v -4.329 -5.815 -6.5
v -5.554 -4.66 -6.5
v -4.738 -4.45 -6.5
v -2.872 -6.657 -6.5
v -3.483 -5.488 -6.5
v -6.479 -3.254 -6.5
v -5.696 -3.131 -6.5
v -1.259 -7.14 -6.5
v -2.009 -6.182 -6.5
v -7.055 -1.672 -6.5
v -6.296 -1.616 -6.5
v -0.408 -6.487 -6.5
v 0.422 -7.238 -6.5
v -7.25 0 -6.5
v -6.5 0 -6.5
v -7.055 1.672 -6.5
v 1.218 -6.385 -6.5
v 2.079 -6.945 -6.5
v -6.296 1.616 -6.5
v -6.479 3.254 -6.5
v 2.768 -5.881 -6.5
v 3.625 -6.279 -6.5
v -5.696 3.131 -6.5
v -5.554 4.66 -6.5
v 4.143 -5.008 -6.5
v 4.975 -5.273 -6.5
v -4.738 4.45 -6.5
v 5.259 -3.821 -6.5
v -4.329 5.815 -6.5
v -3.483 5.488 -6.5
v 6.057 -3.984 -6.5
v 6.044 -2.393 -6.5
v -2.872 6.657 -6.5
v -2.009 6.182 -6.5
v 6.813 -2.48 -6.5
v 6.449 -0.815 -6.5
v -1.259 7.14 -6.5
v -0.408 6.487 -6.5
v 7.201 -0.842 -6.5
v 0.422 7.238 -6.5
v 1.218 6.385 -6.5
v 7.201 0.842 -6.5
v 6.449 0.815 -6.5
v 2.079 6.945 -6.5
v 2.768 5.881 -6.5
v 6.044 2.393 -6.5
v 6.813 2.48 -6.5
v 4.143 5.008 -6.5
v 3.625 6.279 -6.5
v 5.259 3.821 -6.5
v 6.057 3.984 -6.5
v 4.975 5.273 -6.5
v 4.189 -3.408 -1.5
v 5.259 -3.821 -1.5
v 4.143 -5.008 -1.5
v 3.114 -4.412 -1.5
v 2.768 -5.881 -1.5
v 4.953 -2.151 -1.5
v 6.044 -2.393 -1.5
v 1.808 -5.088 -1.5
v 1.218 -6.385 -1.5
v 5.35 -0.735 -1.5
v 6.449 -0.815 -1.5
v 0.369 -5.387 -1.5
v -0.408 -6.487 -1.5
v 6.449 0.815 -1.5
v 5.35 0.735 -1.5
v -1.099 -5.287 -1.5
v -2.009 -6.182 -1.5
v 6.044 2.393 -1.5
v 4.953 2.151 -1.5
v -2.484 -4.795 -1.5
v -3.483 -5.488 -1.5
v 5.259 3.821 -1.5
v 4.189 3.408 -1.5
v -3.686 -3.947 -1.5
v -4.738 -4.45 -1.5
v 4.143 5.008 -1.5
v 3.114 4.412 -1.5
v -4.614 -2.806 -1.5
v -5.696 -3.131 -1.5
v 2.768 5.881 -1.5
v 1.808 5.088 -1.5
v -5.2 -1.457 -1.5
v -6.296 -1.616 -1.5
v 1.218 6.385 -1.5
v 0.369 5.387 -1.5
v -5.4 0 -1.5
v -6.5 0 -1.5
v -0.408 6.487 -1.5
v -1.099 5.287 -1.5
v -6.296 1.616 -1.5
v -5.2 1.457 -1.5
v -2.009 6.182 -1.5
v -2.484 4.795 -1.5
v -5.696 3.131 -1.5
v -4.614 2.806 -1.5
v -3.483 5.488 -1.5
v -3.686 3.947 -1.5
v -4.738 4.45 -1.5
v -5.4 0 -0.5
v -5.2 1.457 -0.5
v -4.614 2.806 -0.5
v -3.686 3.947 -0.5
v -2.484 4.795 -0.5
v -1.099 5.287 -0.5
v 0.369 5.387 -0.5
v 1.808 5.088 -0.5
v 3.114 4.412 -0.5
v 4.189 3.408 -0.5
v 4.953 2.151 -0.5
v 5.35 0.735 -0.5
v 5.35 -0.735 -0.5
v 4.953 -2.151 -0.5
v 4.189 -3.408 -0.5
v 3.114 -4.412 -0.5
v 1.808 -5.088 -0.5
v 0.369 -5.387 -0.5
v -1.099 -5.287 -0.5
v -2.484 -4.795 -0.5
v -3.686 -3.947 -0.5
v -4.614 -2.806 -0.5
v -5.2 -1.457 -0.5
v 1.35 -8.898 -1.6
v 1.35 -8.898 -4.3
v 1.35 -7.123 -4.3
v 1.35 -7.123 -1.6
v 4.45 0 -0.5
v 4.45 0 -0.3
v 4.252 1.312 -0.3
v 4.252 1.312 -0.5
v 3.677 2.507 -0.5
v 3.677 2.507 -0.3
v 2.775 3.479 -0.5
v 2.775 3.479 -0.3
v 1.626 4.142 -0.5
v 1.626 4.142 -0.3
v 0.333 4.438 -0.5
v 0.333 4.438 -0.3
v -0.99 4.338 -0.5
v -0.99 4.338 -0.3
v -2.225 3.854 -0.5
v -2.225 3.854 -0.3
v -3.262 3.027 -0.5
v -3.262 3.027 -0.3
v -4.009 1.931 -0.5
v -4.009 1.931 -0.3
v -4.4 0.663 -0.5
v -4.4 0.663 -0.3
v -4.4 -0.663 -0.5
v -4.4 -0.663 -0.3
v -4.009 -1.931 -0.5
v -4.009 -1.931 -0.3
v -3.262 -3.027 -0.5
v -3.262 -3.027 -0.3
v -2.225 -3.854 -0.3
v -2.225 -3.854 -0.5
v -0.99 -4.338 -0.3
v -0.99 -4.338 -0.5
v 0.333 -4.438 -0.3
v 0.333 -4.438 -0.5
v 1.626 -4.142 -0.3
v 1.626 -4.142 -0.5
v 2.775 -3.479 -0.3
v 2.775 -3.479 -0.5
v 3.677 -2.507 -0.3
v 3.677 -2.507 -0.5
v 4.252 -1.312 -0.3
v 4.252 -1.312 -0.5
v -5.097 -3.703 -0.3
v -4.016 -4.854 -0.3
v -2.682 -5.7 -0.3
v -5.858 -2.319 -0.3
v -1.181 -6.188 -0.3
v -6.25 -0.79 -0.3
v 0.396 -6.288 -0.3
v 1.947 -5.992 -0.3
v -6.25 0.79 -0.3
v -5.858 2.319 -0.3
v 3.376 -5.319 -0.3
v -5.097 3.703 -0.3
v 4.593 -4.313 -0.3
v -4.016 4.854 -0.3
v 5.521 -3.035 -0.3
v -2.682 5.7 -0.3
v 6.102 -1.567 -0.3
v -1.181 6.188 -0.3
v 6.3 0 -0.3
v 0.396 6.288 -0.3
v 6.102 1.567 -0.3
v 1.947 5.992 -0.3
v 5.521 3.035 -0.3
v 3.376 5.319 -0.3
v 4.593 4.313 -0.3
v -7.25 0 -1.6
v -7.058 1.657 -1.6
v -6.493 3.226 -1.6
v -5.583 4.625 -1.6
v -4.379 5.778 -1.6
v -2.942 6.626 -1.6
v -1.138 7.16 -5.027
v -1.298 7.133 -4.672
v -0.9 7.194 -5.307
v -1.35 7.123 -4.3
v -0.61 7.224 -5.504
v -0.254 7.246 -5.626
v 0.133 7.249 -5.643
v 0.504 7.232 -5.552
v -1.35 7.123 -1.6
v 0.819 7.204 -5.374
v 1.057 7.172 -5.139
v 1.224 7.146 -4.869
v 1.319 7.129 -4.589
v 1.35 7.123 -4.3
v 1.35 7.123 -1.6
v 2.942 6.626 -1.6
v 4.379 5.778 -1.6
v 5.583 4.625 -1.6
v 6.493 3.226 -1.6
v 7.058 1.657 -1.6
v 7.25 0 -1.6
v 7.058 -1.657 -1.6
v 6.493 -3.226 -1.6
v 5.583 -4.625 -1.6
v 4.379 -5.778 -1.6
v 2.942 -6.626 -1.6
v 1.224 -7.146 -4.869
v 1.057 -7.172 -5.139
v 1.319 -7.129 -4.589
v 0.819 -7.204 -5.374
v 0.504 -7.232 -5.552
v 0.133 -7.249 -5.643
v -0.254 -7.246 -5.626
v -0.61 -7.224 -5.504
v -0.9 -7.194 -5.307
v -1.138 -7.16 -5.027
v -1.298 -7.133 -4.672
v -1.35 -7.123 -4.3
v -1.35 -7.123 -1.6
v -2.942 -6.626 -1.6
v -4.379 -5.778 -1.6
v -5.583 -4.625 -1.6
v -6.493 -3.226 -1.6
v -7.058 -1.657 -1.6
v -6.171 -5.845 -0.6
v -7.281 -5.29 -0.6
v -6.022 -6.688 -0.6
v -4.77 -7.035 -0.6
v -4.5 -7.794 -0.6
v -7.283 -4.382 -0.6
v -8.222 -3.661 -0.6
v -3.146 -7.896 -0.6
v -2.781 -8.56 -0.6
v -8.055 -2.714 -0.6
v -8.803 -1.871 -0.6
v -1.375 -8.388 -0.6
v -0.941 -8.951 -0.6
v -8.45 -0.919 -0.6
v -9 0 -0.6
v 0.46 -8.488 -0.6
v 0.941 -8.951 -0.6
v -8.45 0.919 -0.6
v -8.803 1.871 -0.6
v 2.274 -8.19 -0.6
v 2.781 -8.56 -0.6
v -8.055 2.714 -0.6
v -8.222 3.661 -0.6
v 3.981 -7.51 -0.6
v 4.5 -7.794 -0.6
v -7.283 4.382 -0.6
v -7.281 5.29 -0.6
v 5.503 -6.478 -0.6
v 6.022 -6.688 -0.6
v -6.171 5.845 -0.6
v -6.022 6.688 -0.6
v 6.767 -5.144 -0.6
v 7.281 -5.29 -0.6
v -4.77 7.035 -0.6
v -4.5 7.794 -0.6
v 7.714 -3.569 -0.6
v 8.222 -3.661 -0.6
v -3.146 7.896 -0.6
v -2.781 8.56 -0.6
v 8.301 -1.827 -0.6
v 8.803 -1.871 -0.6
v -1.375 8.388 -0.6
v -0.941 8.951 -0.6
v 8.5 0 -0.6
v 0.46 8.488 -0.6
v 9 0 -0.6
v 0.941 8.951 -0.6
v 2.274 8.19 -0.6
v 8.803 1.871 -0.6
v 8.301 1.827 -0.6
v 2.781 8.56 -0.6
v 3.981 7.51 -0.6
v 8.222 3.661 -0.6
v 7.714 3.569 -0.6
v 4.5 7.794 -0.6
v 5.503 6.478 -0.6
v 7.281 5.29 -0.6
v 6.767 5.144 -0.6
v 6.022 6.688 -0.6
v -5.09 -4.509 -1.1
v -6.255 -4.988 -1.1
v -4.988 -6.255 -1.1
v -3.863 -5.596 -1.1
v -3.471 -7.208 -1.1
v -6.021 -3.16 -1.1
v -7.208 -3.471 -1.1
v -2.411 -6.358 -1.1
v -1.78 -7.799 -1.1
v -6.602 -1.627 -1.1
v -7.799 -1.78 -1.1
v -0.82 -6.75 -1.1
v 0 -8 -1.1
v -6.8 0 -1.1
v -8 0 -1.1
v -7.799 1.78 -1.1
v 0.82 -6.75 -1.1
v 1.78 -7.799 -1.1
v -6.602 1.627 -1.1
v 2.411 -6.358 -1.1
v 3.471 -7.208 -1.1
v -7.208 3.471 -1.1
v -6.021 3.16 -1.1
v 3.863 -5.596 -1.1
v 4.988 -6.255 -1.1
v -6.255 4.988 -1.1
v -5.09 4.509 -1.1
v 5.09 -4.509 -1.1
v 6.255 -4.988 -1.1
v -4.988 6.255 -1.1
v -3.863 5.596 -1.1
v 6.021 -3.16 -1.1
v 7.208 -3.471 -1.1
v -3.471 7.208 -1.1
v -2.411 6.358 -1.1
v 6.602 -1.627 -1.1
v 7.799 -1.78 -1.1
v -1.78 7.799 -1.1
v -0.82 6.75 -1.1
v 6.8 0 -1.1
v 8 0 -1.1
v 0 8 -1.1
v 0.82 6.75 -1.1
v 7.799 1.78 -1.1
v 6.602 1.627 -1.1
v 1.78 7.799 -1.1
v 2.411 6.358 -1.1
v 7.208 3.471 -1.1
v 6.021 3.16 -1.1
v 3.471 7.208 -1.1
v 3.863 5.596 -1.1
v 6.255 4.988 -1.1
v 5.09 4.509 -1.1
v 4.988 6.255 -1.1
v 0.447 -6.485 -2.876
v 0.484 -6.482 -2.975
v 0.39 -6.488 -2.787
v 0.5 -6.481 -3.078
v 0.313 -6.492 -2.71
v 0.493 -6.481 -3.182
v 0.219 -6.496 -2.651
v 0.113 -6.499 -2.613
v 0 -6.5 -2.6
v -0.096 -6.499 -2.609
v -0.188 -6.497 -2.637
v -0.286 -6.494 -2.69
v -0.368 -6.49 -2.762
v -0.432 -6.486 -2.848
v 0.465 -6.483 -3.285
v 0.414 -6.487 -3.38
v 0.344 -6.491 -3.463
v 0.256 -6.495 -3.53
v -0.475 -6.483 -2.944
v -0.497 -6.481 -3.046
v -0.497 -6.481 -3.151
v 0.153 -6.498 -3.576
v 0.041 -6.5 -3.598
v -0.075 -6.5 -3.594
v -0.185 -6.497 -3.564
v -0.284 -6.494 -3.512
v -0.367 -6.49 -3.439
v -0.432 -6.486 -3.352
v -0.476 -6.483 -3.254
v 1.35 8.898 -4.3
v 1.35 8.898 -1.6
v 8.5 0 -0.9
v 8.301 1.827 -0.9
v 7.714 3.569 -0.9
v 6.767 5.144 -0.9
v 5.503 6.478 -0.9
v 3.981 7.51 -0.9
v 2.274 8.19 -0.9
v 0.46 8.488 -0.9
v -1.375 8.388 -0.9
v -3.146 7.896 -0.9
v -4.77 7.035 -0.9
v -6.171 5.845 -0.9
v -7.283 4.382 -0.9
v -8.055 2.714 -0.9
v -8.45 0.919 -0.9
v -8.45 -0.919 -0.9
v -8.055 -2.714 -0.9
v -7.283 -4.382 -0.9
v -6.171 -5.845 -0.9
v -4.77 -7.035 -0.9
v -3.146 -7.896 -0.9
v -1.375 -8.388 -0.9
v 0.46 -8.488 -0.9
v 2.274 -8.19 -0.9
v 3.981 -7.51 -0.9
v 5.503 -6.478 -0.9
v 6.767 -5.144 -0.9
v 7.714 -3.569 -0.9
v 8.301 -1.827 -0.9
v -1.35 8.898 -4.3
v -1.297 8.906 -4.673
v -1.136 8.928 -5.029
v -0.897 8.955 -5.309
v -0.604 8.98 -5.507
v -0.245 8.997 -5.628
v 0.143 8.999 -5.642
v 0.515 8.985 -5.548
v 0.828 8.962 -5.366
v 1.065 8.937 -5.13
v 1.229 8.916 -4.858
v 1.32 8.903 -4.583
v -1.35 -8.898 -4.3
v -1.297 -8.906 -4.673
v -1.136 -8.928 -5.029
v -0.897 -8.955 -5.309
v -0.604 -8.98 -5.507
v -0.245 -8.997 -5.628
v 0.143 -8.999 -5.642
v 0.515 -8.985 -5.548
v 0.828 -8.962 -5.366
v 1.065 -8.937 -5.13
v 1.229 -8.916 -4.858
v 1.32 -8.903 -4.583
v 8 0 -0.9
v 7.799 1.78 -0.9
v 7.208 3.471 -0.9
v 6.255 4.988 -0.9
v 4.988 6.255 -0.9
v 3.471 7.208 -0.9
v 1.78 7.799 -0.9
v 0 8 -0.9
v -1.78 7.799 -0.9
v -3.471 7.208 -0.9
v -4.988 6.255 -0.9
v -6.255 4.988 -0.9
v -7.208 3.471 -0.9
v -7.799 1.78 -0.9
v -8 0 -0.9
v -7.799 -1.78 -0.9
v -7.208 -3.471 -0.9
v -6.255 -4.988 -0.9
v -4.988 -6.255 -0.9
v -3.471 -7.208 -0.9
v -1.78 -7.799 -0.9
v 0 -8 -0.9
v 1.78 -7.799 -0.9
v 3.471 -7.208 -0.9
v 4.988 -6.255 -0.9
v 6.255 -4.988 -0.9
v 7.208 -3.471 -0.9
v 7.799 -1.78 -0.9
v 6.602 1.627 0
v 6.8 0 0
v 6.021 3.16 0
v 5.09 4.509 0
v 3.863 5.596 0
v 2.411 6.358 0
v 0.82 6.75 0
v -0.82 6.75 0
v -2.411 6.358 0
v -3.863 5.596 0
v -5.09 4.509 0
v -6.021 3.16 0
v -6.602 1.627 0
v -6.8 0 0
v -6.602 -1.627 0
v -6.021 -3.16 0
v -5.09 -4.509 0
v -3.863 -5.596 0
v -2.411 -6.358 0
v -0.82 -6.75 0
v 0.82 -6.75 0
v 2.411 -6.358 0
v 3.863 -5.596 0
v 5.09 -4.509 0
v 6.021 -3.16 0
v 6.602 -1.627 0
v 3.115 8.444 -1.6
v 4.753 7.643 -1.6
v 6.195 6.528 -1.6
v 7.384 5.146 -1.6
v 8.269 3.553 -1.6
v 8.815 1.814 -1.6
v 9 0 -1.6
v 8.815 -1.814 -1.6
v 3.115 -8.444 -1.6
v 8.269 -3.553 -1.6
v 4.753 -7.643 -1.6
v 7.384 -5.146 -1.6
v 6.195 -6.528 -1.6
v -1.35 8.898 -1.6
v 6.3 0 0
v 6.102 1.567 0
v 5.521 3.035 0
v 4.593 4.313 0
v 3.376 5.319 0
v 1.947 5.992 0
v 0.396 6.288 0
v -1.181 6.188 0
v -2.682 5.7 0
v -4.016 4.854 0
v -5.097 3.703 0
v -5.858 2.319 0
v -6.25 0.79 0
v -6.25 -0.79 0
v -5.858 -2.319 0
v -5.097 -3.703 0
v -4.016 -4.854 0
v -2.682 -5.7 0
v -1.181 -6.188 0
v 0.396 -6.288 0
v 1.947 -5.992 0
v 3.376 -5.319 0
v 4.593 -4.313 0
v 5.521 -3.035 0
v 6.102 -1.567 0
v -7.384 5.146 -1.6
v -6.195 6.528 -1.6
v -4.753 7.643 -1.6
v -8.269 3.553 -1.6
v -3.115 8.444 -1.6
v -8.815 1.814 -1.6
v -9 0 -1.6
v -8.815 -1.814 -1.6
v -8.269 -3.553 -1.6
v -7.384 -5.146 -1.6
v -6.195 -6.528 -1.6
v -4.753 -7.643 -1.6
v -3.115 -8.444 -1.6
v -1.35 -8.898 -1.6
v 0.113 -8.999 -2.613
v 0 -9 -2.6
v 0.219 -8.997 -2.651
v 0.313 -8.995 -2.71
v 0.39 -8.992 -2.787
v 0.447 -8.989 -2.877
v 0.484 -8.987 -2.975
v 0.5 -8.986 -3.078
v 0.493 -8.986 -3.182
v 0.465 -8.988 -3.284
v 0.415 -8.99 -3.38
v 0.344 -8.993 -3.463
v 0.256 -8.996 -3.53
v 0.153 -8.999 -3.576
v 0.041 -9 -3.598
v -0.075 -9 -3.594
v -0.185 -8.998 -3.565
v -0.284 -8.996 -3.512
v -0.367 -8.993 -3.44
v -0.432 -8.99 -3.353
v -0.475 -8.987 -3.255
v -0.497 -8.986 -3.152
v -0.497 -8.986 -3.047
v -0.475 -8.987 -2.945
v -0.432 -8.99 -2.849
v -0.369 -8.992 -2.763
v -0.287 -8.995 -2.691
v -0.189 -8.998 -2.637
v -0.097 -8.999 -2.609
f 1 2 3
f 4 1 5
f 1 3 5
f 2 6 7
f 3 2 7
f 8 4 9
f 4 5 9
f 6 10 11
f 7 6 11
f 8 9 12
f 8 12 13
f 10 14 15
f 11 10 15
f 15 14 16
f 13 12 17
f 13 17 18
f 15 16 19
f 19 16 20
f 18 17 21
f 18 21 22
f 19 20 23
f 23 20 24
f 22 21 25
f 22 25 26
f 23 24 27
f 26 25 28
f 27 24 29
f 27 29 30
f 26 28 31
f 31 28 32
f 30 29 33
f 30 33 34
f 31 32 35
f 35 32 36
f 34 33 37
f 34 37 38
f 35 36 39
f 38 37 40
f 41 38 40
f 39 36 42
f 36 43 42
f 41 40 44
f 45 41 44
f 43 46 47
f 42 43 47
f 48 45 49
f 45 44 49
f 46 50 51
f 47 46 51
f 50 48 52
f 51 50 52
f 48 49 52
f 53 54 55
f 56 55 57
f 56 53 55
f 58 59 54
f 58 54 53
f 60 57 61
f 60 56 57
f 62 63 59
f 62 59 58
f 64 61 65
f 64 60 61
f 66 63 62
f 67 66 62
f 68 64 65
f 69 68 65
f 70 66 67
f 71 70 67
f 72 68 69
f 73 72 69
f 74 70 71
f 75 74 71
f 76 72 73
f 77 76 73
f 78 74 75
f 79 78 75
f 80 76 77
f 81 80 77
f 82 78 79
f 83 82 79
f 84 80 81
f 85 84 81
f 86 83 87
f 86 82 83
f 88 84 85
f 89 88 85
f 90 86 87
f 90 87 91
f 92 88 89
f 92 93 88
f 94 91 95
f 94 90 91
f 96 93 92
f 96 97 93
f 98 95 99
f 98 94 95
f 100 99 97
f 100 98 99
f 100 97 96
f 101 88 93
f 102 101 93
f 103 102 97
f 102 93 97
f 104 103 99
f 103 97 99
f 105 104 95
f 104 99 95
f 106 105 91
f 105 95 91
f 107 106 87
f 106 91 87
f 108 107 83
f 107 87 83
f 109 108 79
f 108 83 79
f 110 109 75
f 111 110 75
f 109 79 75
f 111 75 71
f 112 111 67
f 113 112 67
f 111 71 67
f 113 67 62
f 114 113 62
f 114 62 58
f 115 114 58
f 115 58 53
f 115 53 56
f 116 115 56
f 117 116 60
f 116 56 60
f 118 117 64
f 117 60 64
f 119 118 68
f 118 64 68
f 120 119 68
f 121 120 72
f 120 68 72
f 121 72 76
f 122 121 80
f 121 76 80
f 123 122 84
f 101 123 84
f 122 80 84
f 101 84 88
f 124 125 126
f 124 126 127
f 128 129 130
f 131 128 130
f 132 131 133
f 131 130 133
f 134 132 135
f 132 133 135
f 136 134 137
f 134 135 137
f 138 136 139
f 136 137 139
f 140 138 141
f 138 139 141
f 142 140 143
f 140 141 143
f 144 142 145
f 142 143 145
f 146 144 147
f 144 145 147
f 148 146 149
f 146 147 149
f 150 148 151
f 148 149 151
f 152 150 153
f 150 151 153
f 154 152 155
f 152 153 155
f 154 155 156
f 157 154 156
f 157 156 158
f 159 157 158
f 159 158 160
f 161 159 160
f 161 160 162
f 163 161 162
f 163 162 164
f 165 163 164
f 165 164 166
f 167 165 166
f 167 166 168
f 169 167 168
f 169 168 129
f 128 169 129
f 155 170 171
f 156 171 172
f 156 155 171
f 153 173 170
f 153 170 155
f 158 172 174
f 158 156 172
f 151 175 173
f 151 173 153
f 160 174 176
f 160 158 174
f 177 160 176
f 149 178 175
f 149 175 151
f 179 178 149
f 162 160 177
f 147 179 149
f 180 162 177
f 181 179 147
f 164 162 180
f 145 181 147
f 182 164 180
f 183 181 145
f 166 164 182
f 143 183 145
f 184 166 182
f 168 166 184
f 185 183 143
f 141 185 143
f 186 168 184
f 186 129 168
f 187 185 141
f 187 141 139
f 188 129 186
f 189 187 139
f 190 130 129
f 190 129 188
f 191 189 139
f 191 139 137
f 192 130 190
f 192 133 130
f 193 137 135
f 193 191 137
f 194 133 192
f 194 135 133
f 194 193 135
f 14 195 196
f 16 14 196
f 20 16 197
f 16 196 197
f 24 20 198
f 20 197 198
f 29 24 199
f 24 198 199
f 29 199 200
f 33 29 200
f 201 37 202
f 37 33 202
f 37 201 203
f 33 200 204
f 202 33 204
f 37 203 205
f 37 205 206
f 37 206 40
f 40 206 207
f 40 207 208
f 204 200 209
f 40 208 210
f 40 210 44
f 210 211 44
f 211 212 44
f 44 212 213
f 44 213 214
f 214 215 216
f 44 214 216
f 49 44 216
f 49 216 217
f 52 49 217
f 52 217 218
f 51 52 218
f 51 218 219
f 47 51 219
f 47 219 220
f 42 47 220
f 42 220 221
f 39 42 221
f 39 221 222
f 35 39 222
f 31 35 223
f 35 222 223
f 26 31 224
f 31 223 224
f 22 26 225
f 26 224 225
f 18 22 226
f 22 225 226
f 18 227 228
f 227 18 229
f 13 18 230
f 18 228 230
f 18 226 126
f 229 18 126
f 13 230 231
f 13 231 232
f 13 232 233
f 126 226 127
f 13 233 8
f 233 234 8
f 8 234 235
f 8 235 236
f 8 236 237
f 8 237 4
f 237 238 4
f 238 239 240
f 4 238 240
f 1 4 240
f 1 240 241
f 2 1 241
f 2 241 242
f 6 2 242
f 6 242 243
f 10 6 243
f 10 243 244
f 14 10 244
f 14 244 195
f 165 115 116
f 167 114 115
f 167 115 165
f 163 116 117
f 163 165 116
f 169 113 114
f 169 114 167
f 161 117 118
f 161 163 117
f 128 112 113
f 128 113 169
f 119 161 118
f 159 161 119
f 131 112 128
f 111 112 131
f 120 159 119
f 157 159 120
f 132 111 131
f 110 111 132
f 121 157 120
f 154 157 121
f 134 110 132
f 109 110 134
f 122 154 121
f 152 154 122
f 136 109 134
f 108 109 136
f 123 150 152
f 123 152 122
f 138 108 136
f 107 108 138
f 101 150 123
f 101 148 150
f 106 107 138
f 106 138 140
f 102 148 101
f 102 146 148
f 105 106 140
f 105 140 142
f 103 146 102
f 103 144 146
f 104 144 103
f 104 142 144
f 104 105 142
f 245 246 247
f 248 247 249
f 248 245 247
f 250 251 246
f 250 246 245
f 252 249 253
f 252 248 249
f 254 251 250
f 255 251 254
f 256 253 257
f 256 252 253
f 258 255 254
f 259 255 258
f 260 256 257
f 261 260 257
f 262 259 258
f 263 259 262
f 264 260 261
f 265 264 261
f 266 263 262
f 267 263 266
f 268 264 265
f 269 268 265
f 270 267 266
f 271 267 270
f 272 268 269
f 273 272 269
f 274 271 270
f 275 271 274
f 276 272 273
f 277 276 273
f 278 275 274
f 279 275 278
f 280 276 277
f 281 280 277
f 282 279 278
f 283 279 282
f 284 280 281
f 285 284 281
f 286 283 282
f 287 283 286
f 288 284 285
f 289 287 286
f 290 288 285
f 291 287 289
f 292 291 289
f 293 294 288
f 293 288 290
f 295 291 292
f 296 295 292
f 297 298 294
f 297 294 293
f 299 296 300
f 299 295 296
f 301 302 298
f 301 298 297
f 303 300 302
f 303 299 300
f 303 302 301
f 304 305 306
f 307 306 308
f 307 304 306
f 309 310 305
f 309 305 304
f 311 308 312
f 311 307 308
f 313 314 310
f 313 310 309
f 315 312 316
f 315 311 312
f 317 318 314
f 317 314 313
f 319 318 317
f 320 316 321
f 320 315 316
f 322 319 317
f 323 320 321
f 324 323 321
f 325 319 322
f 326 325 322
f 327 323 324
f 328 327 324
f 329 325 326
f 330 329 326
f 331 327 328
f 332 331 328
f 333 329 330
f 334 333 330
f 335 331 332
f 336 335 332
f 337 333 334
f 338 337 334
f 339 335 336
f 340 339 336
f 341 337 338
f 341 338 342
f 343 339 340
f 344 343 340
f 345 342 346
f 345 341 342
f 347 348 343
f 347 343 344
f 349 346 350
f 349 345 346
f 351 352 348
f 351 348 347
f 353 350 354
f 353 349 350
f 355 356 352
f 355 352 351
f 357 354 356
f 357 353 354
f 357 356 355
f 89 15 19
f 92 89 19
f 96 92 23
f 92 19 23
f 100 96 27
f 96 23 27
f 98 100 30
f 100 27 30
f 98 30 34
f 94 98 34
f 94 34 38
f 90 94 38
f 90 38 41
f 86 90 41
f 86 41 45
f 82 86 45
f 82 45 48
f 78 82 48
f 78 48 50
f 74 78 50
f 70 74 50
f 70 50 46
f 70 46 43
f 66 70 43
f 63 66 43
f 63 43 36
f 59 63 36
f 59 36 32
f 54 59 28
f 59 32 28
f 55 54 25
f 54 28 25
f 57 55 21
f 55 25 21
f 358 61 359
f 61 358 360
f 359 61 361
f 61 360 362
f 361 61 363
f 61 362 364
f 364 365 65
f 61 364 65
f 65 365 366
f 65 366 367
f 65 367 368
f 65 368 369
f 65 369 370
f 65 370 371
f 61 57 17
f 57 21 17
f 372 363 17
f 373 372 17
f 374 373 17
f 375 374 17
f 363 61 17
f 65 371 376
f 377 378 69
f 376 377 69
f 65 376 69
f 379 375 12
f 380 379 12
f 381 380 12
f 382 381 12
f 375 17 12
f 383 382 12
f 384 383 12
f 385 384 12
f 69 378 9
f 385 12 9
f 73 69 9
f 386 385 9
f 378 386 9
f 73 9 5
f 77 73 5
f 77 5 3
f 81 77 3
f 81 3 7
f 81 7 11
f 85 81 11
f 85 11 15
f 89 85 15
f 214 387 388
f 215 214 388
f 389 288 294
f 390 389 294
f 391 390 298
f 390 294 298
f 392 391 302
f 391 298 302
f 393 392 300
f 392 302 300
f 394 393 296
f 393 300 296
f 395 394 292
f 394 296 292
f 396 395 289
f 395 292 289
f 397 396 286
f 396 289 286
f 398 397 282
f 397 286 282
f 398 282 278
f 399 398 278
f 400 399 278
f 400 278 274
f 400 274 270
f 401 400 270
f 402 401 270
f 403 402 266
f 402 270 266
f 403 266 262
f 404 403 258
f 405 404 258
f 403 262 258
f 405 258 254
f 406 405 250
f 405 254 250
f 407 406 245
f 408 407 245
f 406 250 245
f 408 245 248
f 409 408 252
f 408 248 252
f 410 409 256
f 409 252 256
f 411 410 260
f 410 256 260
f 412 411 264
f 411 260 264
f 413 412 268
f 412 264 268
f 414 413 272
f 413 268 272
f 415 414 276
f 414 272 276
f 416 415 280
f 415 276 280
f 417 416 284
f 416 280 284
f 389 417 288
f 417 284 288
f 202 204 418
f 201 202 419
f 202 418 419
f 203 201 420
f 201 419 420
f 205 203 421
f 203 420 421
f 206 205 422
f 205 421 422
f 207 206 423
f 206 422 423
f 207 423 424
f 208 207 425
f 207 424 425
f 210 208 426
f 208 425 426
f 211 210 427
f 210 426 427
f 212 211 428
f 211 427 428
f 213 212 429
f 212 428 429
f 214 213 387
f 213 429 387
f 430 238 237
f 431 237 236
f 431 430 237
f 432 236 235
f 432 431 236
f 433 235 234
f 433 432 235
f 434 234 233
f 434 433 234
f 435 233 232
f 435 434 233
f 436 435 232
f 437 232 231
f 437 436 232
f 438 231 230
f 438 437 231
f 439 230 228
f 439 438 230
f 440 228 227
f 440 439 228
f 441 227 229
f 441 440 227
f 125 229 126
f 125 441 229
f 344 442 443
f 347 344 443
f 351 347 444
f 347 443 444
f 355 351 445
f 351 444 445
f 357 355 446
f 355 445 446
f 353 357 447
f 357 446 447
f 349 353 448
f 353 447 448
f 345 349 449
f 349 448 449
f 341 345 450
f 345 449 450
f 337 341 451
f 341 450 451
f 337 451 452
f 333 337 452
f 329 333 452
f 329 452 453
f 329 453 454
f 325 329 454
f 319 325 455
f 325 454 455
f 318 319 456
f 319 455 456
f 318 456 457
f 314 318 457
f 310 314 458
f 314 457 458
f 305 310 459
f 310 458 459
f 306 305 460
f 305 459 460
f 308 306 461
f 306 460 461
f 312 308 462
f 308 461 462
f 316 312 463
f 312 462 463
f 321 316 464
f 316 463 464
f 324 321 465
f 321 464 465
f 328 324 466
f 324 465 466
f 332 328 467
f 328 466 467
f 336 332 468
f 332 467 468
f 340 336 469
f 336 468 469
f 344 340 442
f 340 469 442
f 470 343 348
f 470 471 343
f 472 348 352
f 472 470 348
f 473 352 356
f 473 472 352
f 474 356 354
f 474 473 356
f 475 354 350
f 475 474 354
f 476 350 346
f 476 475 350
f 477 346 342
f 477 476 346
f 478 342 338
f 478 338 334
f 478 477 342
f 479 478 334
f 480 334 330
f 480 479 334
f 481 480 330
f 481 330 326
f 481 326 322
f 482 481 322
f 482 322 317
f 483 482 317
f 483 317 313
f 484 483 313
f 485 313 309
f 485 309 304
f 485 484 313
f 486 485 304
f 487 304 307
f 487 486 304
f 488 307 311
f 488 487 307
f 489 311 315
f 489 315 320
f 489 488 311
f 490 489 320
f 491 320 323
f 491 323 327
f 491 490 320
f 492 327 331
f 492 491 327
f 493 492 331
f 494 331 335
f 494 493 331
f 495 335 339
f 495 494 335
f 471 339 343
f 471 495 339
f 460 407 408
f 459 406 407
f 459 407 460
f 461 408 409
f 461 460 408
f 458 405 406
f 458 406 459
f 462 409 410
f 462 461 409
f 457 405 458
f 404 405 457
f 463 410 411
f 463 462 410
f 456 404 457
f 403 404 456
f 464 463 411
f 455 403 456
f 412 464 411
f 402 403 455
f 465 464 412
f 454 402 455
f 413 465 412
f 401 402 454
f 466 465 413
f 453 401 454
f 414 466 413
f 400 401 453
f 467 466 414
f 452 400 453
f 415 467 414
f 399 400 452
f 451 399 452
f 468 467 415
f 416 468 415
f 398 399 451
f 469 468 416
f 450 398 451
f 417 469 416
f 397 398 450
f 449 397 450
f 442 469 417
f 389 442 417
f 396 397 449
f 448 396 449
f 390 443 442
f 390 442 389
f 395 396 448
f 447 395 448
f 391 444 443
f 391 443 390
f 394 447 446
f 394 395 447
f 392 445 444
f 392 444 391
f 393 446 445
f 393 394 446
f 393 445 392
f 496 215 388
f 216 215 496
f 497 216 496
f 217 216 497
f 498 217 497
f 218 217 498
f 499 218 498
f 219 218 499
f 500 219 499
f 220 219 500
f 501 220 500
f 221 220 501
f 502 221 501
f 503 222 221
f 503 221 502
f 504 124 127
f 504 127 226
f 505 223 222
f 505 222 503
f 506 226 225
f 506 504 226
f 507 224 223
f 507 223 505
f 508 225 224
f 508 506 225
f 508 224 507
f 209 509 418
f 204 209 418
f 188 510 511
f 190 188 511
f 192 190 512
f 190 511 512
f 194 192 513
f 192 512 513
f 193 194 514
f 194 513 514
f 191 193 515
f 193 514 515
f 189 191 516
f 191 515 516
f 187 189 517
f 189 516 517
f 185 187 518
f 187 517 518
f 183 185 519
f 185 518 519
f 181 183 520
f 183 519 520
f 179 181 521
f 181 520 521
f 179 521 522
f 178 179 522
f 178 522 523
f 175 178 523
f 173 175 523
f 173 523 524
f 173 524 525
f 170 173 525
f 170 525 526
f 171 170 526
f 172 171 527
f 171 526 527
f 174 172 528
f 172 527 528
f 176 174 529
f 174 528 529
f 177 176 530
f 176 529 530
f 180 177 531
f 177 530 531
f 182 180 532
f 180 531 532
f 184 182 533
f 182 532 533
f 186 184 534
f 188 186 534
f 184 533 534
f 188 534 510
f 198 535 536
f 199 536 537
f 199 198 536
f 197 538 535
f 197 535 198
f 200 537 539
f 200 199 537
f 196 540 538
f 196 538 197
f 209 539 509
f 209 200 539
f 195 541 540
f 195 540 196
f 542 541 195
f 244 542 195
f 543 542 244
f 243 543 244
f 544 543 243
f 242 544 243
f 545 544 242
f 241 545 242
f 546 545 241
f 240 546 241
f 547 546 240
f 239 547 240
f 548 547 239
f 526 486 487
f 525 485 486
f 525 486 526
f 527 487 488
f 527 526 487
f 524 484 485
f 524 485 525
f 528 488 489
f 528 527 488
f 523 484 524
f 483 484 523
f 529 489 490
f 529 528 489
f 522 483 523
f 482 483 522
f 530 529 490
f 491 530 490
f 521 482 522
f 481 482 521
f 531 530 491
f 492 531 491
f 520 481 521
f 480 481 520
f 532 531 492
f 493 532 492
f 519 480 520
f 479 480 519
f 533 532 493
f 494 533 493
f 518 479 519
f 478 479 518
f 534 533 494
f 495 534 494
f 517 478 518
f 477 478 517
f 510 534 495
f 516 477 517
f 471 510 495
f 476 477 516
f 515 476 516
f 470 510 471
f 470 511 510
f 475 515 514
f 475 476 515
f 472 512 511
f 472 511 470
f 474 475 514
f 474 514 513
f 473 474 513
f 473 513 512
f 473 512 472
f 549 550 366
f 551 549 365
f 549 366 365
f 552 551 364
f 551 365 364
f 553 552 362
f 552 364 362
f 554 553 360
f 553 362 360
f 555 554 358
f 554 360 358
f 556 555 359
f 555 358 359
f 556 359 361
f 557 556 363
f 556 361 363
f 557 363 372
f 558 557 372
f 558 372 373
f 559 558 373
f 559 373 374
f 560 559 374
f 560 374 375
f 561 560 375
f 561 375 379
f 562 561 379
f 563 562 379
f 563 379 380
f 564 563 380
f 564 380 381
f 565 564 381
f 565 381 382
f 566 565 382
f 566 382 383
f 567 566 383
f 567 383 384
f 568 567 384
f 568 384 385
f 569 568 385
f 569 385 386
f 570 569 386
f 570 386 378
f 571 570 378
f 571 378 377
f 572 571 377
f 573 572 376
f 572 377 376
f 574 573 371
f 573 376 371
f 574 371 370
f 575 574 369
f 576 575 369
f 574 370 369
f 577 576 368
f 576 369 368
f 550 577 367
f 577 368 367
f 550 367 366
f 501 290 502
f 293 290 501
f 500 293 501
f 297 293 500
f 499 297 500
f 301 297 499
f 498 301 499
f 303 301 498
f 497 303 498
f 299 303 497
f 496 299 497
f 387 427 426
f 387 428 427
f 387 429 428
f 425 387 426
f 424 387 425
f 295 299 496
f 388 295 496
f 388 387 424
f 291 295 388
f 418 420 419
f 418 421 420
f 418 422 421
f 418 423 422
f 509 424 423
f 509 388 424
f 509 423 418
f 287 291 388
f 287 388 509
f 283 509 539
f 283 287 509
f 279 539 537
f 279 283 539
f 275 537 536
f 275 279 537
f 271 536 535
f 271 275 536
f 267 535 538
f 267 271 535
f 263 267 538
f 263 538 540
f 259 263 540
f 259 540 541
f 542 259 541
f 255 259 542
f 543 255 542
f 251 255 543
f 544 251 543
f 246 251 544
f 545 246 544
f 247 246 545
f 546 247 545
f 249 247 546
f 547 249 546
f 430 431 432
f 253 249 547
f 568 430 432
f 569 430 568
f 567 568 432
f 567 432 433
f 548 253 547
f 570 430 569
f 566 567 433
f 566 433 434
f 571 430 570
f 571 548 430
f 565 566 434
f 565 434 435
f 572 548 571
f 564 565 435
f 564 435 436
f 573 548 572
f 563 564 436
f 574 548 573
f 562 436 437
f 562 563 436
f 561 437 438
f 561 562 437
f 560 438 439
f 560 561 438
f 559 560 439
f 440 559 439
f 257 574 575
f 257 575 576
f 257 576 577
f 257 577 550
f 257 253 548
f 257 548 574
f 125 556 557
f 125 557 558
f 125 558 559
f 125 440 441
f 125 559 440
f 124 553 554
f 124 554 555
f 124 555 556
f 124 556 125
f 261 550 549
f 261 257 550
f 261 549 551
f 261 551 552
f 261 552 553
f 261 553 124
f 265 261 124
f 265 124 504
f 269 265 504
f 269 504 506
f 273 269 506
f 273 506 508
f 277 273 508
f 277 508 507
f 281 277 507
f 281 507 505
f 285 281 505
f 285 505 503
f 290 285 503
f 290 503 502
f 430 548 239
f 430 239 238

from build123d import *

# Parameters (mm, degrees)
SKETCH1_R                            = 9
SKETCH1_R_2                          = 4.45
BOSS_EXTRUDE1_DEPTH                  = 6.5
CUT_EXTRUDE1_START                   = -4.9
SKETCH2_R                            = 9
SKETCH2_R_2                          = 7.25
CUT_EXTRUDE1_DEPTH                   = 4.9
SKETCH4_R                            = 6.3
SKETCH4_R_2                          = 4.45
CUT_EXTRUDE2_DEPTH                   = 0.3
SKETCH5_R                            = 9
SKETCH5_R_2                          = 6.8
CUT_EXTRUDE3_DEPTH                   = 0.6
SKETCH6_R                            = 8.5
SKETCH6_R_2                          = 6.8
CUT_EXTRUDE4_DEPTH                   = 0.3
SKETCH7_R                            = 6.5
CUT_EXTRUDE5_DEPTH                   = 5
SKETCH8_R                            = 5.4
CUT_EXTRUDE6_DEPTH                   = 1
BOSS_EXTRUDE5_REACH                  = 21.68
BOSS_EXTRUDE5_END_RADIUS             = 9
BOSS_EXTRUDE5_DIRECTION_2_REACH      = 21.68
BOSS_EXTRUDE5_DIRECTION_2_END_RADIUS = 7.25
SKETCH11_R                           = 0.5
CUT_EXTRUDE7_DEPTH                   = 15.291606127
SKETCH12_R                           = 8
SKETCH12_R_2                         = 6.8
CUT_EXTRUDE8_DEPTH                   = 0.2


with BuildPart() as part:
    # Sketch1 → Boss-Extrude1 (new body)
    with BuildSketch(Plane.XY):
        Circle(SKETCH1_R)
        Circle(SKETCH1_R_2, mode=Mode.SUBTRACT)
    extrude(amount=-BOSS_EXTRUDE1_DEPTH)

    # Sketch2 → Cut-Extrude1 (cut)
    with BuildSketch(Plane(origin=(0, 0, -6.5), x_dir=(-1, 0, 0), z_dir=(0, 0, -1)).offset(CUT_EXTRUDE1_START)):
        with Locations(Location((0, 0, 0), (0, 0, 180))):
            Circle(SKETCH2_R)
        Circle(SKETCH2_R_2, mode=Mode.SUBTRACT)
    extrude(amount=CUT_EXTRUDE1_DEPTH, mode=Mode.SUBTRACT)

    # Sketch4 → Cut-Extrude2 (cut)
    with BuildSketch(Plane.XY):
        Circle(SKETCH4_R)
        Circle(SKETCH4_R_2, mode=Mode.SUBTRACT)
    extrude(amount=-CUT_EXTRUDE2_DEPTH, mode=Mode.SUBTRACT)

    # Sketch5 → Cut-Extrude3 (cut)
    with BuildSketch(Plane.XY):
        Circle(SKETCH5_R)
        Circle(SKETCH5_R_2, mode=Mode.SUBTRACT)
    extrude(amount=-CUT_EXTRUDE3_DEPTH, mode=Mode.SUBTRACT)

    # Sketch6 → Cut-Extrude4 (cut)
    with BuildSketch(Plane.XY.offset(-0.6)):
        Circle(SKETCH6_R)
        Circle(SKETCH6_R_2, mode=Mode.SUBTRACT)
    extrude(amount=-CUT_EXTRUDE4_DEPTH, mode=Mode.SUBTRACT)

    # Sketch7 → Cut-Extrude5 (cut)
    with BuildSketch(Plane(origin=(0, 0, -6.5), x_dir=(-1, 0, 0), z_dir=(0, 0, -1))):
        Circle(SKETCH7_R)
    extrude(amount=-CUT_EXTRUDE5_DEPTH, mode=Mode.SUBTRACT)

    # Sketch8 → Cut-Extrude6 (cut)
    with BuildSketch(Plane(origin=(0, 0, -1.5), x_dir=(-1, 0, 0), z_dir=(0, 0, -1))):
        Circle(SKETCH8_R)
    extrude(amount=-CUT_EXTRUDE6_DEPTH, mode=Mode.SUBTRACT)


with BuildPart() as body_2:
    # Boss-Extrude5: up to this cylinder (the profile starts inside it)
    boss_extrude5_end = Plane(origin=(0, 0, -3.492216), z_dir=(0, 0, 1)) * Cylinder(BOSS_EXTRUDE5_END_RADIUS, 62.36, mode=Mode.PRIVATE)
    # Sketch9 → Boss-Extrude5 (new, up to the surface)
    with BuildSketch(Plane(origin=(0, 7.25, 0), x_dir=(1, 0, 0), z_dir=(0, 1, 0)), mode=Mode.PRIVATE) as boss_extrude5_sk1:
        with BuildLine():
            Line((-1.35, 1.6), (-1.35, 4.3))
            ThreePointArc((-1.35, 4.3), (0, 5.65), (1.35, 4.3))
            Line((1.35, 4.3), (1.35, 1.6))
            Line((1.35, 1.6), (-1.35, 1.6))
        make_face()
    boss_extrude5_tool1 = extrude(boss_extrude5_sk1.sketch, amount=BOSS_EXTRUDE5_REACH, mode=Mode.PRIVATE) & boss_extrude5_end
    add(boss_extrude5_tool1.solids().sort_by_distance((0, 7.25, -3.492216))[0])

    # Boss-Extrude5 direction 2: up to this cylinder (the profile starts outside it)
    boss_extrude5_direction_2_end = Plane(origin=(0, 0, -3.492216), z_dir=(0, 0, -1)) * Cylinder(BOSS_EXTRUDE5_DIRECTION_2_END_RADIUS, 58.86, mode=Mode.PRIVATE)
    # Sketch9 → Boss-Extrude5 direction 2 (add, up to the surface)
    with BuildSketch(Plane(origin=(0, 7.25, 0), x_dir=(1, 0, 0), z_dir=(0, 1, 0)), mode=Mode.PRIVATE) as boss_extrude5_direction_2_sk1:
        with BuildLine():
            Line((-1.35, 1.6), (-1.35, 4.3))
            ThreePointArc((-1.35, 4.3), (0, 5.65), (1.35, 4.3))
            Line((1.35, 4.3), (1.35, 1.6))
            Line((1.35, 1.6), (-1.35, 1.6))
        make_face()
    boss_extrude5_direction_2_tool1 = extrude(boss_extrude5_direction_2_sk1.sketch, amount=-BOSS_EXTRUDE5_DIRECTION_2_REACH, mode=Mode.PRIVATE) - boss_extrude5_direction_2_end
    add(boss_extrude5_direction_2_tool1.solids().sort_by_distance((0, 7.25, -3.492216))[0])
    add(boss_extrude5_direction_2_tool1.solids().sort_by_distance((0, 7.25, -3.492216))[1])


with BuildPart() as body_3:
    # Mirror2: mirrored copy
    add(body_2.part.mirror(Plane.ZX))


with BuildPart() as body_2_1:
    add(body_2.part)

    # Combine3: union part, body 3
    add(part.part)
    add(body_3.part)

    # Sketch11 → Cut-Extrude7 (cut, through all)
    with BuildSketch(Plane(origin=(0, 0, 0), x_dir=(1, 0, 0), z_dir=(0, 1, 0))):
        with Locations(Location((0, 3.1, 0), (0, 0, 270))):
            Circle(SKETCH11_R)
    extrude(amount=-CUT_EXTRUDE7_DEPTH, mode=Mode.SUBTRACT)

    # Sketch12 → Cut-Extrude8 (cut)
    with BuildSketch(Plane.XY.offset(-0.9)):
        Circle(SKETCH12_R)
        Circle(SKETCH12_R_2, mode=Mode.SUBTRACT)
    extrude(amount=-CUT_EXTRUDE8_DEPTH, mode=Mode.SUBTRACT)


solid = body_2_1.part
